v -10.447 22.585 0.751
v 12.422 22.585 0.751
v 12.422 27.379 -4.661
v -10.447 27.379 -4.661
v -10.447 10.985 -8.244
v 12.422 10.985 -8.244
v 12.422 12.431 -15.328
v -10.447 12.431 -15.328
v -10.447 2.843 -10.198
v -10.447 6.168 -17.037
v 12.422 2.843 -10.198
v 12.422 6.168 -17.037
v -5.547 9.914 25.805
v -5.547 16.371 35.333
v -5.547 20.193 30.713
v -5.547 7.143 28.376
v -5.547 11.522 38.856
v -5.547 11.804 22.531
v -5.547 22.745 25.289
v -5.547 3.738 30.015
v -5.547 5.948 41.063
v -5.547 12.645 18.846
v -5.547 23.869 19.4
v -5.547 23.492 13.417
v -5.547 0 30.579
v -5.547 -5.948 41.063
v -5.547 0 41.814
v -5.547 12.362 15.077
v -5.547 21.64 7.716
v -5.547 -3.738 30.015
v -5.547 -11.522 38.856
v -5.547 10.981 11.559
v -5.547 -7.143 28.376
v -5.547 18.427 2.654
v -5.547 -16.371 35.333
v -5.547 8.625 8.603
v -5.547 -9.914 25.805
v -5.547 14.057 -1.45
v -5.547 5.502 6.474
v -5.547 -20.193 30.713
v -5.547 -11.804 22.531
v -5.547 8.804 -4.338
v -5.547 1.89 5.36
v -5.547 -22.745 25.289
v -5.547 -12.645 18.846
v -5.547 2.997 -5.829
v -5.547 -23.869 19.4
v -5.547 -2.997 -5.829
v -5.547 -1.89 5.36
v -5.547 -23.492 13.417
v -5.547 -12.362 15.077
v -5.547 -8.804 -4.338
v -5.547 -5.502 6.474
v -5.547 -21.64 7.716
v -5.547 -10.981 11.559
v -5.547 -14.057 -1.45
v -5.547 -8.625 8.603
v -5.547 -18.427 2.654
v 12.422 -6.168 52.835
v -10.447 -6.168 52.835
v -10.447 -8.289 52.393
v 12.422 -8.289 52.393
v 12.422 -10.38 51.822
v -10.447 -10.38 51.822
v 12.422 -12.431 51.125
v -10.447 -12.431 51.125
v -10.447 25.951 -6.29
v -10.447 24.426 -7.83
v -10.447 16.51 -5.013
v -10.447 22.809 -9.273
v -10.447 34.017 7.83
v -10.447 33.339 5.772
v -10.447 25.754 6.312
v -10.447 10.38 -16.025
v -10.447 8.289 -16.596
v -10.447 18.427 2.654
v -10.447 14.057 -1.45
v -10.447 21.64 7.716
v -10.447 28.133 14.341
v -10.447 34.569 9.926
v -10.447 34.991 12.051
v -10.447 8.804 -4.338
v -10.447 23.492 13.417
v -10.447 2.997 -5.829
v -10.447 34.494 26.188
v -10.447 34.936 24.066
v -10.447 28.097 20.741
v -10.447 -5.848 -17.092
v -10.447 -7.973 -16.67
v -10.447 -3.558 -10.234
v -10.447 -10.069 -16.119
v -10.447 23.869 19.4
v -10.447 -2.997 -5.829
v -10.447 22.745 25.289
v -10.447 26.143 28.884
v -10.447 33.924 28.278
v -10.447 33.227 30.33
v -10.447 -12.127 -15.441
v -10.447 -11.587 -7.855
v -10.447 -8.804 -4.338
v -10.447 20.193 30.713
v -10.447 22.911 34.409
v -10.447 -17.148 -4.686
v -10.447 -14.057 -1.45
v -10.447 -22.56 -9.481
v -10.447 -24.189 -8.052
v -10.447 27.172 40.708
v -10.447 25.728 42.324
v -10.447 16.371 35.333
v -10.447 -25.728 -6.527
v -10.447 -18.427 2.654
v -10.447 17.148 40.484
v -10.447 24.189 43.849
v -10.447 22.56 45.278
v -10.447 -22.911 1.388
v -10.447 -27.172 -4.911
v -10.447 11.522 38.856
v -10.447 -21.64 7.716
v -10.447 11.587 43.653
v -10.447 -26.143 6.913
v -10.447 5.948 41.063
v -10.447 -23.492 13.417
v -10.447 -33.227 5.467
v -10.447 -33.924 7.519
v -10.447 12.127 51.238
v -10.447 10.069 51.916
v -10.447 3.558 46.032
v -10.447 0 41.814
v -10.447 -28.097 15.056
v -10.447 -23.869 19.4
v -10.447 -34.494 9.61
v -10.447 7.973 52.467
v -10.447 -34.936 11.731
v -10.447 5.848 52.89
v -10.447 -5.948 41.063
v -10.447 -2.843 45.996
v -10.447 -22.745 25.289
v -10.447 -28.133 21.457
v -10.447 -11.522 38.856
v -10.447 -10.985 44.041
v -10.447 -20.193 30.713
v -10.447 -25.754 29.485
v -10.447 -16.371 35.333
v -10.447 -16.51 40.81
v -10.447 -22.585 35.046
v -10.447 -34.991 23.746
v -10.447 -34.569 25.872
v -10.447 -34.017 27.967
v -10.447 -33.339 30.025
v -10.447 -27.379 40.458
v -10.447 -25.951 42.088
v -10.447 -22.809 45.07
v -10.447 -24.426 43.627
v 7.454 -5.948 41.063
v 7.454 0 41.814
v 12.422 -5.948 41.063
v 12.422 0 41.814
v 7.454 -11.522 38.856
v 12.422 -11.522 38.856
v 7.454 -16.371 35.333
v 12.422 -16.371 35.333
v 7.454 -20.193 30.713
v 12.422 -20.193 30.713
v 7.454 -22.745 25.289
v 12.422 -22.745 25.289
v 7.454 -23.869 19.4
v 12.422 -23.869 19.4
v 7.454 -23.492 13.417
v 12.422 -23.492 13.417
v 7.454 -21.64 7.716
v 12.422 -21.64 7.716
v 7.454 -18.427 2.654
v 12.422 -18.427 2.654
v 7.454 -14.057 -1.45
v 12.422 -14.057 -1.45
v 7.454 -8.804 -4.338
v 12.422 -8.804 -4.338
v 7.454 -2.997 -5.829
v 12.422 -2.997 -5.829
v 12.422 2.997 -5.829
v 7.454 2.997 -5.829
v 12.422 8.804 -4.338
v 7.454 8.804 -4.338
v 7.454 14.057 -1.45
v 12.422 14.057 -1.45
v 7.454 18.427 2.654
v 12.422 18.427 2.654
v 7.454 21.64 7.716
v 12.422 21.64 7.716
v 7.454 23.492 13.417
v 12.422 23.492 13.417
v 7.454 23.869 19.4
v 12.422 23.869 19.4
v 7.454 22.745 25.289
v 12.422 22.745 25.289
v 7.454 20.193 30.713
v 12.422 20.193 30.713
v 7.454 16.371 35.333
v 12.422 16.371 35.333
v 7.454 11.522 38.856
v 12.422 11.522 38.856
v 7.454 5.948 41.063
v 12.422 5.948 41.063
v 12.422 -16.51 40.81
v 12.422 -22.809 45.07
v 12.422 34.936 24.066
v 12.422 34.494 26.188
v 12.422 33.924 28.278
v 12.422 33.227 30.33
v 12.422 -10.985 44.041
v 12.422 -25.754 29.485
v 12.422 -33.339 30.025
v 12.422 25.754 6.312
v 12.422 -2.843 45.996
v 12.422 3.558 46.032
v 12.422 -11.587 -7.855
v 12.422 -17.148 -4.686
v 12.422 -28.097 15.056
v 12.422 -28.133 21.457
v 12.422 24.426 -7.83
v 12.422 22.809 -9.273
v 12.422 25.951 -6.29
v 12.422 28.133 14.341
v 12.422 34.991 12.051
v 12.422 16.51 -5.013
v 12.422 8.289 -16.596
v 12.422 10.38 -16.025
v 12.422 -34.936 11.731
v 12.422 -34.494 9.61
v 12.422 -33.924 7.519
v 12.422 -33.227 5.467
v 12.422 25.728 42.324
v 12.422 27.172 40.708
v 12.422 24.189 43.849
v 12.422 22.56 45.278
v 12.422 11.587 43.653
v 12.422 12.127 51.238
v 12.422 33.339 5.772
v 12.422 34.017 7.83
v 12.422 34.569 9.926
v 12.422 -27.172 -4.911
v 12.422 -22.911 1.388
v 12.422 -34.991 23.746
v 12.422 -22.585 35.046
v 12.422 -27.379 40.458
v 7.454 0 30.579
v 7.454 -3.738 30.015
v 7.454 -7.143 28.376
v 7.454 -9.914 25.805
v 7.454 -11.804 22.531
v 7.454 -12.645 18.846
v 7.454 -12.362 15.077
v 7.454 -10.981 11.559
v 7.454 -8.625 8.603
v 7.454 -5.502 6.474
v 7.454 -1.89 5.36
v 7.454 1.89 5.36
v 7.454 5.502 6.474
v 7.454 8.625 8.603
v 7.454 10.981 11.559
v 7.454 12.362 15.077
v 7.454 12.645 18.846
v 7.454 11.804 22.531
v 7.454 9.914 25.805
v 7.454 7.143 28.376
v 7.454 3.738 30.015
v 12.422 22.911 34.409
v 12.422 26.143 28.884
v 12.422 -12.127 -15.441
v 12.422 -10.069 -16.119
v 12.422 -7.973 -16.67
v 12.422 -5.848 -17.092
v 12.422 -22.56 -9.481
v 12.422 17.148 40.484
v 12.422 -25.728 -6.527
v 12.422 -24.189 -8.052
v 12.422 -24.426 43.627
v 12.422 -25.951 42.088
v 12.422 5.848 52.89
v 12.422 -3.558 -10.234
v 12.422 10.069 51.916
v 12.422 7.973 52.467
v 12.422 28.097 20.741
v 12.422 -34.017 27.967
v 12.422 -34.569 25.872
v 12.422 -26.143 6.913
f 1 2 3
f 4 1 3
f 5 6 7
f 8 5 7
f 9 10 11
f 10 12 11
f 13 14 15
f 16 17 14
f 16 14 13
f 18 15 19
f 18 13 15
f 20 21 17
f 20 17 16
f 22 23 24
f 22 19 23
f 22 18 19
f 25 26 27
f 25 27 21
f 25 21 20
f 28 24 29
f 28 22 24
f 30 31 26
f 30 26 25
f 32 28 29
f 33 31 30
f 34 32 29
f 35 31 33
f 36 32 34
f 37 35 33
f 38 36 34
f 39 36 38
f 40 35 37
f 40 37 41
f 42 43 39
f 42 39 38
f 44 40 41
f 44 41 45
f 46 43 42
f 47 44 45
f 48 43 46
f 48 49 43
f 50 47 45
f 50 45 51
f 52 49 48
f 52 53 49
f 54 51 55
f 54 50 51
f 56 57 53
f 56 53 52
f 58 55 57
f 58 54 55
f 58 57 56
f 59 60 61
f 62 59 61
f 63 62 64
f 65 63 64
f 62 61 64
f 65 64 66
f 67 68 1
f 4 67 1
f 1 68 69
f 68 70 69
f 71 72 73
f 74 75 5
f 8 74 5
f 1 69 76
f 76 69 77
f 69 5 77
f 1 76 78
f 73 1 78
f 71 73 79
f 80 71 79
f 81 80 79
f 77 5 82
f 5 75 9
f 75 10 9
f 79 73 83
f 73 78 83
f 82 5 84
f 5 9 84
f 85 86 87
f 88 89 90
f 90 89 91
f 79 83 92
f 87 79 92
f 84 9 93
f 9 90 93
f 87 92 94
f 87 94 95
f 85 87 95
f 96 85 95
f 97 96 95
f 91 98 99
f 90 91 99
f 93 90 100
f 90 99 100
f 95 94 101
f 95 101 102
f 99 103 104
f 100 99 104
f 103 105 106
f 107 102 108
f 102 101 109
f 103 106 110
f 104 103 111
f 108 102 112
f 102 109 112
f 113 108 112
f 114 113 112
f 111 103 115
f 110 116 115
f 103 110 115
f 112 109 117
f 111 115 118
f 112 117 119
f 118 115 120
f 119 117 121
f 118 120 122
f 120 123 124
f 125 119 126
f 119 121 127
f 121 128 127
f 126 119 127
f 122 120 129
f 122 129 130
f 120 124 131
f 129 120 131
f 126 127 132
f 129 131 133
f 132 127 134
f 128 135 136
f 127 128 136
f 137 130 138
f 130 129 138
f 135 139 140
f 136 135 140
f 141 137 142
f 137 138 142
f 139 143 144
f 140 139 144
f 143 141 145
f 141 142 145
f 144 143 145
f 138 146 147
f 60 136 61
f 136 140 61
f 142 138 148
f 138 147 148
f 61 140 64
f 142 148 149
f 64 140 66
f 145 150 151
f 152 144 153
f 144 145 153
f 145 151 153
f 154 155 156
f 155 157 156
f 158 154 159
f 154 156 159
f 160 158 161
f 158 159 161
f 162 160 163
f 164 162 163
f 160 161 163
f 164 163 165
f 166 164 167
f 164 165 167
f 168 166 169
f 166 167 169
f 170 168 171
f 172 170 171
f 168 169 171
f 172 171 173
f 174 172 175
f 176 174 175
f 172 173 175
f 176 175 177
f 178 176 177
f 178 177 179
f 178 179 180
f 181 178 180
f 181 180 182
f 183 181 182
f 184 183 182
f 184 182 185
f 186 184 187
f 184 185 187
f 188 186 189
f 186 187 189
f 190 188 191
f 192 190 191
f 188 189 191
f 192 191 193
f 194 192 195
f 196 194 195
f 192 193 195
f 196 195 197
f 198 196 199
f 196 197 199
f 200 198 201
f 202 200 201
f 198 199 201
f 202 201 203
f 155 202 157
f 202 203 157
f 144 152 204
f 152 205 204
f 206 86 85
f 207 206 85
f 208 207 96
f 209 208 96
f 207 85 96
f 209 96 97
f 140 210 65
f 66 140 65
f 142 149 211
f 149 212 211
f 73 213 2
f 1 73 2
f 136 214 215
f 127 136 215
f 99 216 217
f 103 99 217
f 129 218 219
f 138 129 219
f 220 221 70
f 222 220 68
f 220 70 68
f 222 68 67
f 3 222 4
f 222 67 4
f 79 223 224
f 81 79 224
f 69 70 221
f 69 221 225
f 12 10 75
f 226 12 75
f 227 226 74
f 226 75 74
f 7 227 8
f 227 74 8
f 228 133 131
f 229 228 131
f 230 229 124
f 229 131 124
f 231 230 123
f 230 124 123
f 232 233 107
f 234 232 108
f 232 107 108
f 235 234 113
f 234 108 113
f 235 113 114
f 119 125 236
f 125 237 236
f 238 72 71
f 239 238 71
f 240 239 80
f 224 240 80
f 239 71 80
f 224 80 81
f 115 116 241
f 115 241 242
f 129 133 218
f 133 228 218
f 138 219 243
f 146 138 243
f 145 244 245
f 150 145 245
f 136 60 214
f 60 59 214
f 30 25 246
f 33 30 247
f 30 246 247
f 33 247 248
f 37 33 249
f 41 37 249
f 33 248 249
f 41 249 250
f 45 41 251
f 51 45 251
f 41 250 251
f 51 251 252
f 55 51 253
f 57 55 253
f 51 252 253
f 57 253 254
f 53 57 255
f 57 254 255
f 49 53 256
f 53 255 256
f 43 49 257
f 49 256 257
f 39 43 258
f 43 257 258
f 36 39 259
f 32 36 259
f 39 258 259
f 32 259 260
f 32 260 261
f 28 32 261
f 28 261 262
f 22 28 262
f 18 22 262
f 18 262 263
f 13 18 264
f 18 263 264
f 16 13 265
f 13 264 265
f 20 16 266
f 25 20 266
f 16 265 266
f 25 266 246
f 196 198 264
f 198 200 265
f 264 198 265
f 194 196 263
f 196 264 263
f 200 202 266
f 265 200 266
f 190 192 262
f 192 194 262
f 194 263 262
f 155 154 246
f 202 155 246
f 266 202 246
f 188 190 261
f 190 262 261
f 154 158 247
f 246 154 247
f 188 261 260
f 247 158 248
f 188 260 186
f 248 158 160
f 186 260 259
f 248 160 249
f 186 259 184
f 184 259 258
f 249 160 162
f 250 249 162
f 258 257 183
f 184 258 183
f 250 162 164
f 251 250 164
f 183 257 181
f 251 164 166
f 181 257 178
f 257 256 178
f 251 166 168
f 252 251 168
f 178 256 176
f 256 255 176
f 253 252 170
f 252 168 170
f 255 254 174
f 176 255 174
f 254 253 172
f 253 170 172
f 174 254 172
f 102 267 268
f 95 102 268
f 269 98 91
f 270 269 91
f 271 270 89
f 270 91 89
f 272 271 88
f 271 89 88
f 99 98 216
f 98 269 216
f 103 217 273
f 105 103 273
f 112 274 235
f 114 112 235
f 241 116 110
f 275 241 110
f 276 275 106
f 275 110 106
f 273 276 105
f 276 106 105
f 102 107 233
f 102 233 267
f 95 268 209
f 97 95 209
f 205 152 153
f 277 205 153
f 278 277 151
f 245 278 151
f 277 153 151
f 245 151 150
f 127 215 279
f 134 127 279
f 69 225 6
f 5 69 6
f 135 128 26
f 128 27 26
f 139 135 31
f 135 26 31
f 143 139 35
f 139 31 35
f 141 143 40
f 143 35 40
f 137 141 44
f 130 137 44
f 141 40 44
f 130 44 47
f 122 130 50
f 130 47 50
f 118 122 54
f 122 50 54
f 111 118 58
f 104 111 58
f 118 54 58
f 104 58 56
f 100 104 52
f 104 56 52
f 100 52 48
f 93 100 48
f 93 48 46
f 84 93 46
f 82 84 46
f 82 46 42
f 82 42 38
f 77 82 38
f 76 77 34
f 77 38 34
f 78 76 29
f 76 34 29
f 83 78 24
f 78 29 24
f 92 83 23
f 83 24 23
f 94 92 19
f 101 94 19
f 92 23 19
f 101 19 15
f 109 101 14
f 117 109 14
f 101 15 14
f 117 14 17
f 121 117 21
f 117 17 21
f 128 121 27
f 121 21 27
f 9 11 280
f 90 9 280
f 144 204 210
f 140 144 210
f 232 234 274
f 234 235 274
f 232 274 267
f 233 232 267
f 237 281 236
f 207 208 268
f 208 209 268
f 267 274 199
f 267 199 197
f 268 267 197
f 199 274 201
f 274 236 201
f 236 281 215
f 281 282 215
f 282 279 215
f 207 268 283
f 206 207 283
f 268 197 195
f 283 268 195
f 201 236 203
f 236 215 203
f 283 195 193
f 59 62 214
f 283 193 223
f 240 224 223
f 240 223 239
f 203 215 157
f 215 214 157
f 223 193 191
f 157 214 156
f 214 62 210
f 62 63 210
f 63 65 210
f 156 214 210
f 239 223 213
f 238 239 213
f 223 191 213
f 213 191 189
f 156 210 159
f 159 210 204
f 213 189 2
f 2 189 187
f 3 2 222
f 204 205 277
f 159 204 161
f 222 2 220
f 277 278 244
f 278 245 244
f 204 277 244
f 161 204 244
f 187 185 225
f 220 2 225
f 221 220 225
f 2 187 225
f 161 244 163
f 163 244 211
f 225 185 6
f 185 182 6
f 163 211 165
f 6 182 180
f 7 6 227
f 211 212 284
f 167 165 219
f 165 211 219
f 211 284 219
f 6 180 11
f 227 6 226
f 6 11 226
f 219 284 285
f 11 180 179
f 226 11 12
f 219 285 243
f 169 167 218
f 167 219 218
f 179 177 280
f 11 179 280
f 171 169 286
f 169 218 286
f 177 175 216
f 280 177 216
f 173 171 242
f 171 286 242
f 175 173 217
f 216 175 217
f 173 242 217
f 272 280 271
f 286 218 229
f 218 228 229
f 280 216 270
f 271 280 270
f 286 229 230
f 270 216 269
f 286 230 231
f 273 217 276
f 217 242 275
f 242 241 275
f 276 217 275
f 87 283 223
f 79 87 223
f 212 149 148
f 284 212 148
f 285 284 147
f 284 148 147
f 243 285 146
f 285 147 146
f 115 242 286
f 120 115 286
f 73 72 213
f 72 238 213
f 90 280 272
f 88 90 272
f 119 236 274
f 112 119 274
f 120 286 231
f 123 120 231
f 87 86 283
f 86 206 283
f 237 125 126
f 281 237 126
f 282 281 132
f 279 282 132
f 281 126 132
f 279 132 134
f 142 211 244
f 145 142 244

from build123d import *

# Parameters (mm, degrees)
F0_W     = 13.0011960864
F0_H     = 11.2356059253
F3_DEPTH = 35.5538306758
F4_COUNT = 12


with BuildPart() as f1:
    # F0 (on Front) → F1 (revolve)
    with BuildSketch(Plane.XZ):
        Polygon((12.4220475554, 53.374812007), (-10.4466825724, 53.374812007), (-10.4466825724, 41.814442724), (-5.5474191904, 41.814442724), (7.453776896, 41.814442724), (12.4220475554, 41.814442724), align=None)
        with Locations((0.9531788528, 36.1966397613)):
            Rectangle(F0_W, F0_H)
    revolve(axis=Axis((1.9577341154, 0, 17.8986564279), (1, 0, 0)))

    # F2 (on Right) → F3 (cut, symmetric)
    with BuildSketch(Plane.YZ):
        Polygon((6.6623128951, 55.3299412131), (-6.9674830884, 54.4798821211), (-2.8427802026, 45.9955856204), (3.5579316318, 46.0315644741), align=None)
    f3 = extrude(amount=F3_DEPTH, both=True, mode=Mode.SUBTRACT)

    # F4: F3 ×12 about axis
    f4_axis = Axis((12.4220475554, 0, 17.8986564279), (1, 0, 0))
    for i in range(1, F4_COUNT):
        add(f3.rotate(f4_axis, i * 360 / F4_COUNT), mode=Mode.SUBTRACT)


solid = f1.part
